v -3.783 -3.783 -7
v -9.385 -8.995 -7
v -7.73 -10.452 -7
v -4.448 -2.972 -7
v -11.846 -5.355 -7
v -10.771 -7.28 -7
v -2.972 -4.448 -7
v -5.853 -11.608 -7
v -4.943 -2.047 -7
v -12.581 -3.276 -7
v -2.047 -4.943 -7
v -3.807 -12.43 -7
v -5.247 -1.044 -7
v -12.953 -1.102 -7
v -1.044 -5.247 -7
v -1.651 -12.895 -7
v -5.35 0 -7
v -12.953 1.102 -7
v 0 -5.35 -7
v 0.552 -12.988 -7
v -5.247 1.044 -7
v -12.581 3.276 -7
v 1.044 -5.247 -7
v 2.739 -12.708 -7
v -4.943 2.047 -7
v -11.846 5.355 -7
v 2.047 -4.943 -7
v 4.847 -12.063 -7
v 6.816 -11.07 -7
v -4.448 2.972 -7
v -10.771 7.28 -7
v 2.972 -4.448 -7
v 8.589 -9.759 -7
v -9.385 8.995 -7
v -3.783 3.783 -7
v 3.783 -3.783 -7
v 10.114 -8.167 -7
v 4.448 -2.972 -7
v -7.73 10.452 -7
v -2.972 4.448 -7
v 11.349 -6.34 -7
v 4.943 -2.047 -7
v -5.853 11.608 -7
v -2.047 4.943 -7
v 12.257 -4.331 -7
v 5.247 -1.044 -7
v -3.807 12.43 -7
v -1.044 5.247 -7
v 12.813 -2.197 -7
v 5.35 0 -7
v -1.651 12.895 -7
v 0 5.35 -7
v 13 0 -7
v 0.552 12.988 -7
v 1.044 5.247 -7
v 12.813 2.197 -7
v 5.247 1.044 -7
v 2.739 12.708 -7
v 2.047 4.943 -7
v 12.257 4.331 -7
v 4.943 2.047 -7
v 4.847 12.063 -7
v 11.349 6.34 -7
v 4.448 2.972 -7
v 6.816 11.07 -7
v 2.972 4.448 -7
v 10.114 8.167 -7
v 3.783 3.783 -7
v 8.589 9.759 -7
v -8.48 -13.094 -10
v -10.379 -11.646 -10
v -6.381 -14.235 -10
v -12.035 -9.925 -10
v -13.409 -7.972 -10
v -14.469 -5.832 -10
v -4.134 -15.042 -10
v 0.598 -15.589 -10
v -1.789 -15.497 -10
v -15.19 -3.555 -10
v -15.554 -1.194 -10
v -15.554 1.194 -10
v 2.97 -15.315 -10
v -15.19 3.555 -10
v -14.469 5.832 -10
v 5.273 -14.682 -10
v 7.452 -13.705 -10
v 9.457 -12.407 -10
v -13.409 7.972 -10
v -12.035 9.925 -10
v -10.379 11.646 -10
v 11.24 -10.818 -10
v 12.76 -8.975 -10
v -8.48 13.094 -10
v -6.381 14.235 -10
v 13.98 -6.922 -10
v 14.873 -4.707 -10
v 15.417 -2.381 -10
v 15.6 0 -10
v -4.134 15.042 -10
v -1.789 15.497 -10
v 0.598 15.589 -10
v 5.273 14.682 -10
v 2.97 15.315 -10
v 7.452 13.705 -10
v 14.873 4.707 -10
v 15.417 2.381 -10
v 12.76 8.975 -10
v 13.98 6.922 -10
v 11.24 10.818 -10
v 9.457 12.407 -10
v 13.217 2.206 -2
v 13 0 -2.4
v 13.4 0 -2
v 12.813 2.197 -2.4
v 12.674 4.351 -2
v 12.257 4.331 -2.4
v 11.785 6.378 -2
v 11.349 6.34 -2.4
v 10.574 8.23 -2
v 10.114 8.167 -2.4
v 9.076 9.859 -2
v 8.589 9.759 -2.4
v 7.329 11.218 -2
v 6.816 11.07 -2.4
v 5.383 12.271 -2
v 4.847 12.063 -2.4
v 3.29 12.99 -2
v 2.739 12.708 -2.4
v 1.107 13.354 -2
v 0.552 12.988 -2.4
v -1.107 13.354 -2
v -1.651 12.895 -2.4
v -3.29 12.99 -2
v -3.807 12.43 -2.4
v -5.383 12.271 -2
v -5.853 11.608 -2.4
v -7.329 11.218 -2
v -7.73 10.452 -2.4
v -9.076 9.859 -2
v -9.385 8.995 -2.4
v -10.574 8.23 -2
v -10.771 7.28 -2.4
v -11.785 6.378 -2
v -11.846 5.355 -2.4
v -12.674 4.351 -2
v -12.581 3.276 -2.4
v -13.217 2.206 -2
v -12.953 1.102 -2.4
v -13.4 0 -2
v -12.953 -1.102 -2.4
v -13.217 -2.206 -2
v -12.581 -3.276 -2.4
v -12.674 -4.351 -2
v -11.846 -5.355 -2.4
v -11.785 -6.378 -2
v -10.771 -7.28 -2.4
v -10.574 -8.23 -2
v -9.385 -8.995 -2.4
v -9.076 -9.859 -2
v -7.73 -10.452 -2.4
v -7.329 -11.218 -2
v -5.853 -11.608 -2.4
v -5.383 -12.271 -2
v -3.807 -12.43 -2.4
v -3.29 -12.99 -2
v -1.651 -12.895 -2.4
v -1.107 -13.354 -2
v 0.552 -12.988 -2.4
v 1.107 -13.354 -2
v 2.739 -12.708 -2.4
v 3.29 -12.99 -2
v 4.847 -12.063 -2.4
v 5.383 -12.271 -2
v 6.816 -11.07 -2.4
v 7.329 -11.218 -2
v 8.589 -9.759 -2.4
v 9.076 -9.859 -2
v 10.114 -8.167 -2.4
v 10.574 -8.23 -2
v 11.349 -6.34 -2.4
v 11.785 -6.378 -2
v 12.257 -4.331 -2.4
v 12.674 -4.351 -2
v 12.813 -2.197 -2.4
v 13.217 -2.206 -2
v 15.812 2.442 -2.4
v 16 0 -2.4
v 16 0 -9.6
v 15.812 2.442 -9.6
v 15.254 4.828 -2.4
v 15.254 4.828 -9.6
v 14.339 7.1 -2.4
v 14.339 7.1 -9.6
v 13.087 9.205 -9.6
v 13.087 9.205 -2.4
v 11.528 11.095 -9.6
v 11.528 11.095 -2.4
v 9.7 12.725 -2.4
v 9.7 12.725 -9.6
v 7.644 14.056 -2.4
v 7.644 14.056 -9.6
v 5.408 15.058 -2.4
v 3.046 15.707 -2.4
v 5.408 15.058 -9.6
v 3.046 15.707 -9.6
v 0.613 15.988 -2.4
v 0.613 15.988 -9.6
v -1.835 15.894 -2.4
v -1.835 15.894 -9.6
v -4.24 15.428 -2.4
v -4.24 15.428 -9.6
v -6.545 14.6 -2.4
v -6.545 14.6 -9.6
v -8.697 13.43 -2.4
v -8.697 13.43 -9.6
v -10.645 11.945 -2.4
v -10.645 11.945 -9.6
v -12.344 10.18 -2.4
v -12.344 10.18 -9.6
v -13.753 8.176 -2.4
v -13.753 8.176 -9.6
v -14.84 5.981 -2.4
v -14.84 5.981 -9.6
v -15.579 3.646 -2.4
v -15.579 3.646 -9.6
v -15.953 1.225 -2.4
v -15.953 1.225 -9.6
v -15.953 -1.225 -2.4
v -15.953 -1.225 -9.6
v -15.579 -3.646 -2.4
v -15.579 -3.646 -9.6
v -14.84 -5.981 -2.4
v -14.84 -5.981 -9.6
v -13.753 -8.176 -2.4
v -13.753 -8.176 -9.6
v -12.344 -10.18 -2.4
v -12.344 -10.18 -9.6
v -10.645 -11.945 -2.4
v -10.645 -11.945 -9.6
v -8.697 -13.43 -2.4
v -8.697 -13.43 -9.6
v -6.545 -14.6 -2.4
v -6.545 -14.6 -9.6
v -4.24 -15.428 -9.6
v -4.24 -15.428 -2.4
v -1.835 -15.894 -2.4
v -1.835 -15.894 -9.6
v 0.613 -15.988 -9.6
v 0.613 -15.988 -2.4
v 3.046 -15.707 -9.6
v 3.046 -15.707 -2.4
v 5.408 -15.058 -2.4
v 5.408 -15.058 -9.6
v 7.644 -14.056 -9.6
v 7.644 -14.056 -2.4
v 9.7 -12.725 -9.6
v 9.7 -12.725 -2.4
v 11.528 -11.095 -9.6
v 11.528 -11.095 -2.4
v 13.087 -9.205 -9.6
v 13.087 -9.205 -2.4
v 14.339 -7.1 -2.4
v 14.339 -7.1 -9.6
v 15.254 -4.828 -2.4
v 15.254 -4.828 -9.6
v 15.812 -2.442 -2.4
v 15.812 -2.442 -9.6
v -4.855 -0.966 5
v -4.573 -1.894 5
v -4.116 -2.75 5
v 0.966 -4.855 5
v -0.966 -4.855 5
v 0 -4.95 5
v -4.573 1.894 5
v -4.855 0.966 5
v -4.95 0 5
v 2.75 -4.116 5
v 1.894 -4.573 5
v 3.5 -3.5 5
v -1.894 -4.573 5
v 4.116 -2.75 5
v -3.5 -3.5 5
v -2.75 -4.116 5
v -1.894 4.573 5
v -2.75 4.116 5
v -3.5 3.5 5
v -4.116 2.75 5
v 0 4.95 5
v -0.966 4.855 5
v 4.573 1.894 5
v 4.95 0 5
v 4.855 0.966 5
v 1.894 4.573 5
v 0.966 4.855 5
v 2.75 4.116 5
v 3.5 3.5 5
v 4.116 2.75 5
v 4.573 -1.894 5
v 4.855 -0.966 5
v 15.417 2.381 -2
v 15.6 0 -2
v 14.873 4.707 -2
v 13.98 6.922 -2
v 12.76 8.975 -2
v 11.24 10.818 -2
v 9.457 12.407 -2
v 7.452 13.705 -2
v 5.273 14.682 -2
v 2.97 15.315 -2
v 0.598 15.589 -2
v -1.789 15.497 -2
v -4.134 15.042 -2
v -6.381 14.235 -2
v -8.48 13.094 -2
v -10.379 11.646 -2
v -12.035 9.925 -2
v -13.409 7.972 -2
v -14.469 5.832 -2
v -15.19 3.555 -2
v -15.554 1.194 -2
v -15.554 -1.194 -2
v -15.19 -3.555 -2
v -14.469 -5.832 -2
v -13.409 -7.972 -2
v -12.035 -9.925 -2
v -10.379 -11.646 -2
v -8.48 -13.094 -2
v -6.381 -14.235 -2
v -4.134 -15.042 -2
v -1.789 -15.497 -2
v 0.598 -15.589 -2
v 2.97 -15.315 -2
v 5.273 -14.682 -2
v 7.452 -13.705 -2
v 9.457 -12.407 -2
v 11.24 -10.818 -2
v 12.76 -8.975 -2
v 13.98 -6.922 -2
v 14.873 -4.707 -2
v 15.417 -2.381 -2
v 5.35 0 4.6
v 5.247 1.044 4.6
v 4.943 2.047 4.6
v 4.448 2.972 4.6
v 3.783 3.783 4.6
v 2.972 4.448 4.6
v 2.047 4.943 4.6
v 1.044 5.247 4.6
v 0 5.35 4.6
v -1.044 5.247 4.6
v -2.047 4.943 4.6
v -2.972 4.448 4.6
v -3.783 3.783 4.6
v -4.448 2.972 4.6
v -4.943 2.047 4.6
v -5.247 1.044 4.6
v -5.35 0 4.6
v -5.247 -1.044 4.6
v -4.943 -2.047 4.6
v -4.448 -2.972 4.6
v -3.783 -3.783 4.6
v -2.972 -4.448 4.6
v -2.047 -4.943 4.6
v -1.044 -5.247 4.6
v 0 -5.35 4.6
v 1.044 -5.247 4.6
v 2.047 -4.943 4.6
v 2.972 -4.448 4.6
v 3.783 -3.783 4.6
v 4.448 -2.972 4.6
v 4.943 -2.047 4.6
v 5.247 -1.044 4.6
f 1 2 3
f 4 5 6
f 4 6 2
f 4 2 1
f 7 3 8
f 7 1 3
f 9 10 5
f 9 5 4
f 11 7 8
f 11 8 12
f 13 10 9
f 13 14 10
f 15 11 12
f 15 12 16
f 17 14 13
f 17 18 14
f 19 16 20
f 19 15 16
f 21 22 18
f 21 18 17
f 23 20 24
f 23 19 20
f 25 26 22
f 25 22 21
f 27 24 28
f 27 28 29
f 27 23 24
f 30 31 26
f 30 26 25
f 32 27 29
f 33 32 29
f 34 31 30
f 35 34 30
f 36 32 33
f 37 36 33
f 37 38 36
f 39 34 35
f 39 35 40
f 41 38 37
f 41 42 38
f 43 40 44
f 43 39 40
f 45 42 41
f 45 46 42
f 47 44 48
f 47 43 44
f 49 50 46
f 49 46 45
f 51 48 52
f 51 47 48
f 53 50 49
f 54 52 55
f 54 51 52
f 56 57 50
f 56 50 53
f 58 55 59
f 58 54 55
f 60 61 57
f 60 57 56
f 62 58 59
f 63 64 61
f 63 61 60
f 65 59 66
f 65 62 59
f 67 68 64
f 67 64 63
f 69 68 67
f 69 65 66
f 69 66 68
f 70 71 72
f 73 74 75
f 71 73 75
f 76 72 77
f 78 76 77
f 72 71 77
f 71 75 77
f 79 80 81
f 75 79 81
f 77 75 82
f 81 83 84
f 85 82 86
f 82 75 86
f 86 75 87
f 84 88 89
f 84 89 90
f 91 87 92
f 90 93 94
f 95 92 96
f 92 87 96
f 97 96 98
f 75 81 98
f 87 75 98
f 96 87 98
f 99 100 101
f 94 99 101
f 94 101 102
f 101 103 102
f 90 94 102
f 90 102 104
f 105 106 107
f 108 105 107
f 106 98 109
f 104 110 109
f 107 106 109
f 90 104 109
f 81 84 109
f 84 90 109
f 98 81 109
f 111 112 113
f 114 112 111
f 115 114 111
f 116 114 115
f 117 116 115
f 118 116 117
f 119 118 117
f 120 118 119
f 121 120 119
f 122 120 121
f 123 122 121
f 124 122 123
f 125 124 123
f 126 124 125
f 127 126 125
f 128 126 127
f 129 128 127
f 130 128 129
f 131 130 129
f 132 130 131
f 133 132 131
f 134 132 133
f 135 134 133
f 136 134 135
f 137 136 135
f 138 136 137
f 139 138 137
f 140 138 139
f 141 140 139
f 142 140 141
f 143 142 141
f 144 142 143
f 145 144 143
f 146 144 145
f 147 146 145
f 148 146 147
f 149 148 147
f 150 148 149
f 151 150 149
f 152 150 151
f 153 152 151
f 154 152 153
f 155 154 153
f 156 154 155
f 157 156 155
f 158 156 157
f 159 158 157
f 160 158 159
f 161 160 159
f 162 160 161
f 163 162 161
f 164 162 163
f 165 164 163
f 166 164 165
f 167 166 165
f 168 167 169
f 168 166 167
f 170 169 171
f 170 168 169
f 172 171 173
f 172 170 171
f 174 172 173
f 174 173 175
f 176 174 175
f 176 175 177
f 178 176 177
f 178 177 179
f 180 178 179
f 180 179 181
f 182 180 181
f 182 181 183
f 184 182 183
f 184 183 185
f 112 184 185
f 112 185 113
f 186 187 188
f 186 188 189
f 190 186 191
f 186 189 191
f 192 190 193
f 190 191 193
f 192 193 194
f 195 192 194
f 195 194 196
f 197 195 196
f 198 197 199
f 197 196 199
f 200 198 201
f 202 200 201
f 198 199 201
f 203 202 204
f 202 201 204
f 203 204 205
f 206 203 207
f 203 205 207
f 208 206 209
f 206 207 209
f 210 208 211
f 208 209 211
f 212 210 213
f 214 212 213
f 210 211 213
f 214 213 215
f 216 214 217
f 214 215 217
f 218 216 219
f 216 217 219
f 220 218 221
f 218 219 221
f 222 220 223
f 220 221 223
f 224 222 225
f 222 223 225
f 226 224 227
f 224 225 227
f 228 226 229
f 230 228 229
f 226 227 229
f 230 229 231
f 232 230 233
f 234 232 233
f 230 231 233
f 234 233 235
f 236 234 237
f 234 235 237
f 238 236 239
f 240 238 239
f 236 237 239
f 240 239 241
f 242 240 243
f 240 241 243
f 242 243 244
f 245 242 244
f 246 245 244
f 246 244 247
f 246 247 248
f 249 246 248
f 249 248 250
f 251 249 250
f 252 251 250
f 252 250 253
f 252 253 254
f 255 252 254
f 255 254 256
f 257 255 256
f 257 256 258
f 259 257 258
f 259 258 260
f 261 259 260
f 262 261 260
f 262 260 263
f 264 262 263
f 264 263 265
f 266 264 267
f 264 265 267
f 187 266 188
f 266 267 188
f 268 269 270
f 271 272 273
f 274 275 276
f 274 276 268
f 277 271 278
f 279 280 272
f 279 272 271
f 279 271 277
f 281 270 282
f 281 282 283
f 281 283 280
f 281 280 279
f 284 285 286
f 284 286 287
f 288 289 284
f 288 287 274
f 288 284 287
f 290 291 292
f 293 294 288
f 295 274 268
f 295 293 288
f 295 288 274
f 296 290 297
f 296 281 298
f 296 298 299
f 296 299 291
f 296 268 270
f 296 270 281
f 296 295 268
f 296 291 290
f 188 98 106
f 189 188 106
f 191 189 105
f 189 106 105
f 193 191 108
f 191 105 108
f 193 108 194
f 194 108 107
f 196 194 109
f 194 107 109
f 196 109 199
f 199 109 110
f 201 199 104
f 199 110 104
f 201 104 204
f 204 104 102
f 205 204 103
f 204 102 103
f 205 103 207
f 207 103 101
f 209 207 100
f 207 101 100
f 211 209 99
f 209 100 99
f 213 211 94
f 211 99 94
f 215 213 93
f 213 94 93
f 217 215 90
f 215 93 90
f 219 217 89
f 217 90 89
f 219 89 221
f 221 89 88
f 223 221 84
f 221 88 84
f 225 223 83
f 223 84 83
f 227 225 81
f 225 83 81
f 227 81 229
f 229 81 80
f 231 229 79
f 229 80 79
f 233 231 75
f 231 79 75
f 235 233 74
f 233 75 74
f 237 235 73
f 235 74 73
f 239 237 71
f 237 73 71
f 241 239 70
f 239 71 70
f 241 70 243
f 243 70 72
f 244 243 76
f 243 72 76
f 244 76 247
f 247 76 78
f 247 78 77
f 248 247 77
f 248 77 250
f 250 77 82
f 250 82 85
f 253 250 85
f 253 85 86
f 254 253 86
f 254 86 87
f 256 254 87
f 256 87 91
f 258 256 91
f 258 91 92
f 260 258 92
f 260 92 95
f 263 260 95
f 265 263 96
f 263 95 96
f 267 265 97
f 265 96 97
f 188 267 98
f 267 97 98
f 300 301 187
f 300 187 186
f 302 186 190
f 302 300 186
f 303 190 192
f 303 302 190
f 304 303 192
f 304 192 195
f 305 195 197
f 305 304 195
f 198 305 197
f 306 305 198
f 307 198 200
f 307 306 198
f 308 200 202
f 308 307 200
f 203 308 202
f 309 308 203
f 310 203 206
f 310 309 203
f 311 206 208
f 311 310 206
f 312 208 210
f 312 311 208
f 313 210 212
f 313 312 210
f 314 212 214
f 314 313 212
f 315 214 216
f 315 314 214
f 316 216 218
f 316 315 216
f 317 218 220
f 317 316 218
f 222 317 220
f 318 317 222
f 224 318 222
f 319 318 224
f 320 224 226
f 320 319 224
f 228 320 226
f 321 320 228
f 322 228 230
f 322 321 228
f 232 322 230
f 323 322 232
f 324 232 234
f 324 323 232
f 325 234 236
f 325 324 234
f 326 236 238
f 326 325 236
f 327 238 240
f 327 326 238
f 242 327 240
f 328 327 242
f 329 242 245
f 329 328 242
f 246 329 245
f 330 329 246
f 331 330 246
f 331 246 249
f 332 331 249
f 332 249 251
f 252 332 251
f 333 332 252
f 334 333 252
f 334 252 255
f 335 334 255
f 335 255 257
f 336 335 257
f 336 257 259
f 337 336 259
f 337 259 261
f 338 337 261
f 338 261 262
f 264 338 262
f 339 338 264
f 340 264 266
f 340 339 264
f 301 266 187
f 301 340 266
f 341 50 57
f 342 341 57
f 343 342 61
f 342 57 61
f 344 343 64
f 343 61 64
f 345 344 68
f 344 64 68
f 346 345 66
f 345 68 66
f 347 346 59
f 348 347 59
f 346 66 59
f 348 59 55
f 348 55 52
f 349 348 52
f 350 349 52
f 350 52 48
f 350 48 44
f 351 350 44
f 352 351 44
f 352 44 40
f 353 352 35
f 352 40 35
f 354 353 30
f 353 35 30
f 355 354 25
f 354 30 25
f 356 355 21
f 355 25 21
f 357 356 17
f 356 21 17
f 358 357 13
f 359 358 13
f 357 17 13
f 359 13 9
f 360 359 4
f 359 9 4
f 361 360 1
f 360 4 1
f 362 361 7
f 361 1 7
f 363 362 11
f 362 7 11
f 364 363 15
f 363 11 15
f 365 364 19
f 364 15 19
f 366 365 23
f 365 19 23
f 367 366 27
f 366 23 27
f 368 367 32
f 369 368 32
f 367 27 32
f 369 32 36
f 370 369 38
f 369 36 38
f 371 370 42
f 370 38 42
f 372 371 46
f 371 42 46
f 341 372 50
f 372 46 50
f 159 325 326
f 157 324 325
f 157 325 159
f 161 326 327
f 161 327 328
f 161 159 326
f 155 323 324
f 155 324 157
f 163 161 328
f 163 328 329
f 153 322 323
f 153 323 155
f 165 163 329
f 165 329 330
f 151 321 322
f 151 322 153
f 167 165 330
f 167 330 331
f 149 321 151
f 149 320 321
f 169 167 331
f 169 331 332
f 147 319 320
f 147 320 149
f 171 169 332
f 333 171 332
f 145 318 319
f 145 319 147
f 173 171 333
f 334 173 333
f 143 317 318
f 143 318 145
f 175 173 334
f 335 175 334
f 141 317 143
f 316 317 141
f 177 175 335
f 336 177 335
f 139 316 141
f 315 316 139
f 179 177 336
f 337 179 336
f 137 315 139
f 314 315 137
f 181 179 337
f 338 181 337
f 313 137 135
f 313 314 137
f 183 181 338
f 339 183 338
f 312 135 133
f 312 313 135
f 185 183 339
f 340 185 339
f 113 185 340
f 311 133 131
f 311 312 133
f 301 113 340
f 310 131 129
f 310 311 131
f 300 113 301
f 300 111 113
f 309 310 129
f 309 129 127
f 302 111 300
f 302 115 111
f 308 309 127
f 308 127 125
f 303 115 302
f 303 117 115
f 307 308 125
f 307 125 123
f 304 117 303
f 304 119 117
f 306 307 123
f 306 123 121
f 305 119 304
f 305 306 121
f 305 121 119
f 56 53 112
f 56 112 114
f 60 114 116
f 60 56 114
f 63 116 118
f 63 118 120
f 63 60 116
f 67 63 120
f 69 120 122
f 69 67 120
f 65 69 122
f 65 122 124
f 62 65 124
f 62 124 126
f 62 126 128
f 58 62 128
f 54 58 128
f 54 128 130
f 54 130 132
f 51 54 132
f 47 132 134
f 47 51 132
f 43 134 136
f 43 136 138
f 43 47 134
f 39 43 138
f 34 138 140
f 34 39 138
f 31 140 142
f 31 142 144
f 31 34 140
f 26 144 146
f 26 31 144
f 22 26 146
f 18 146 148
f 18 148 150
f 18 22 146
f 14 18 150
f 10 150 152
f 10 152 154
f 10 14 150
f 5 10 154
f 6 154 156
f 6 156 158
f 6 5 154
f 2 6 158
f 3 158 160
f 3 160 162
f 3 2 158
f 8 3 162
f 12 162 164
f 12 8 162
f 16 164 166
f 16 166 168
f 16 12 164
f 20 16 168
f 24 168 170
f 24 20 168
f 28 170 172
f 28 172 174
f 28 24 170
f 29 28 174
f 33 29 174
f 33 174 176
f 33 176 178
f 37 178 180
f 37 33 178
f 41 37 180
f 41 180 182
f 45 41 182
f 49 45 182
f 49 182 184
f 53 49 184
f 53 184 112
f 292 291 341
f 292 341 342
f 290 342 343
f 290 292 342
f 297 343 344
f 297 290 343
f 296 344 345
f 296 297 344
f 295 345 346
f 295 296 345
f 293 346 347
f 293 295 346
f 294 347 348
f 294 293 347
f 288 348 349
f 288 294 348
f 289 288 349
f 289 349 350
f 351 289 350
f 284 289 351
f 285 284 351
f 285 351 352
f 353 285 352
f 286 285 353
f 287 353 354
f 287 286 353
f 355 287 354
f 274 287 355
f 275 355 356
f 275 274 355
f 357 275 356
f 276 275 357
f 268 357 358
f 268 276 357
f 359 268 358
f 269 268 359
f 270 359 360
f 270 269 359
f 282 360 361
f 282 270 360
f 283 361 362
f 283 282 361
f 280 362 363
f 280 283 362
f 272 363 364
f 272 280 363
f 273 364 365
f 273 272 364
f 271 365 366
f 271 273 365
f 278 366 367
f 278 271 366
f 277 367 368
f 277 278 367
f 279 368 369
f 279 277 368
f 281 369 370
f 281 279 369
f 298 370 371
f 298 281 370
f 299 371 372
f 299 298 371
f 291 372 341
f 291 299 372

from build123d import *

# Parameters (mm, degrees)
CYLINDER041_R               = 5.35
CYLINDER041_DEPTH           = 12
CYLINDER043_R               = 13
CYLINDER043_DEPTH           = 5
CYLINDER042_R               = 16
CYLINDER042_DEPTH           = 8
CHAMFER003068012002092_SIZE = 0.4


with BuildPart() as cylinder041:
    # Cylinder041 → Cylinder041 (new body)
    with BuildSketch(Plane.XY.offset(-7)):
        Circle(CYLINDER041_R)
    extrude(amount=CYLINDER041_DEPTH)


with BuildPart() as cylinder043:
    # Cylinder043 → Cylinder043 (new body)
    with BuildSketch(Plane.XY.offset(-7)):
        Circle(CYLINDER043_R)
    extrude(amount=CYLINDER043_DEPTH)


with BuildPart() as bearing_remover_top:
    # Cylinder042 → Cylinder042 (new body)
    with BuildSketch(Plane.XY.offset(-10)):
        Circle(CYLINDER042_R)
    extrude(amount=CYLINDER042_DEPTH)

    # Cut001043: cut Cylinder043
    add(cylinder043.part, mode=Mode.SUBTRACT)

    # Fusion001002012037: union Cylinder041
    add(cylinder041.part)

    # Chamfer003068012002092
    chamfer003068012002092_edges = [bearing_remover_top.edges().sort_by_distance(p)[0] for p in [
        (-16, 0, -2),
        (-16, 0, -10),
        (-13, 0, -2),
        (-5.35, 0, 5),
    ]]
    chamfer(chamfer003068012002092_edges, length=CHAMFER003068012002092_SIZE)


solid = bearing_remover_top.part
